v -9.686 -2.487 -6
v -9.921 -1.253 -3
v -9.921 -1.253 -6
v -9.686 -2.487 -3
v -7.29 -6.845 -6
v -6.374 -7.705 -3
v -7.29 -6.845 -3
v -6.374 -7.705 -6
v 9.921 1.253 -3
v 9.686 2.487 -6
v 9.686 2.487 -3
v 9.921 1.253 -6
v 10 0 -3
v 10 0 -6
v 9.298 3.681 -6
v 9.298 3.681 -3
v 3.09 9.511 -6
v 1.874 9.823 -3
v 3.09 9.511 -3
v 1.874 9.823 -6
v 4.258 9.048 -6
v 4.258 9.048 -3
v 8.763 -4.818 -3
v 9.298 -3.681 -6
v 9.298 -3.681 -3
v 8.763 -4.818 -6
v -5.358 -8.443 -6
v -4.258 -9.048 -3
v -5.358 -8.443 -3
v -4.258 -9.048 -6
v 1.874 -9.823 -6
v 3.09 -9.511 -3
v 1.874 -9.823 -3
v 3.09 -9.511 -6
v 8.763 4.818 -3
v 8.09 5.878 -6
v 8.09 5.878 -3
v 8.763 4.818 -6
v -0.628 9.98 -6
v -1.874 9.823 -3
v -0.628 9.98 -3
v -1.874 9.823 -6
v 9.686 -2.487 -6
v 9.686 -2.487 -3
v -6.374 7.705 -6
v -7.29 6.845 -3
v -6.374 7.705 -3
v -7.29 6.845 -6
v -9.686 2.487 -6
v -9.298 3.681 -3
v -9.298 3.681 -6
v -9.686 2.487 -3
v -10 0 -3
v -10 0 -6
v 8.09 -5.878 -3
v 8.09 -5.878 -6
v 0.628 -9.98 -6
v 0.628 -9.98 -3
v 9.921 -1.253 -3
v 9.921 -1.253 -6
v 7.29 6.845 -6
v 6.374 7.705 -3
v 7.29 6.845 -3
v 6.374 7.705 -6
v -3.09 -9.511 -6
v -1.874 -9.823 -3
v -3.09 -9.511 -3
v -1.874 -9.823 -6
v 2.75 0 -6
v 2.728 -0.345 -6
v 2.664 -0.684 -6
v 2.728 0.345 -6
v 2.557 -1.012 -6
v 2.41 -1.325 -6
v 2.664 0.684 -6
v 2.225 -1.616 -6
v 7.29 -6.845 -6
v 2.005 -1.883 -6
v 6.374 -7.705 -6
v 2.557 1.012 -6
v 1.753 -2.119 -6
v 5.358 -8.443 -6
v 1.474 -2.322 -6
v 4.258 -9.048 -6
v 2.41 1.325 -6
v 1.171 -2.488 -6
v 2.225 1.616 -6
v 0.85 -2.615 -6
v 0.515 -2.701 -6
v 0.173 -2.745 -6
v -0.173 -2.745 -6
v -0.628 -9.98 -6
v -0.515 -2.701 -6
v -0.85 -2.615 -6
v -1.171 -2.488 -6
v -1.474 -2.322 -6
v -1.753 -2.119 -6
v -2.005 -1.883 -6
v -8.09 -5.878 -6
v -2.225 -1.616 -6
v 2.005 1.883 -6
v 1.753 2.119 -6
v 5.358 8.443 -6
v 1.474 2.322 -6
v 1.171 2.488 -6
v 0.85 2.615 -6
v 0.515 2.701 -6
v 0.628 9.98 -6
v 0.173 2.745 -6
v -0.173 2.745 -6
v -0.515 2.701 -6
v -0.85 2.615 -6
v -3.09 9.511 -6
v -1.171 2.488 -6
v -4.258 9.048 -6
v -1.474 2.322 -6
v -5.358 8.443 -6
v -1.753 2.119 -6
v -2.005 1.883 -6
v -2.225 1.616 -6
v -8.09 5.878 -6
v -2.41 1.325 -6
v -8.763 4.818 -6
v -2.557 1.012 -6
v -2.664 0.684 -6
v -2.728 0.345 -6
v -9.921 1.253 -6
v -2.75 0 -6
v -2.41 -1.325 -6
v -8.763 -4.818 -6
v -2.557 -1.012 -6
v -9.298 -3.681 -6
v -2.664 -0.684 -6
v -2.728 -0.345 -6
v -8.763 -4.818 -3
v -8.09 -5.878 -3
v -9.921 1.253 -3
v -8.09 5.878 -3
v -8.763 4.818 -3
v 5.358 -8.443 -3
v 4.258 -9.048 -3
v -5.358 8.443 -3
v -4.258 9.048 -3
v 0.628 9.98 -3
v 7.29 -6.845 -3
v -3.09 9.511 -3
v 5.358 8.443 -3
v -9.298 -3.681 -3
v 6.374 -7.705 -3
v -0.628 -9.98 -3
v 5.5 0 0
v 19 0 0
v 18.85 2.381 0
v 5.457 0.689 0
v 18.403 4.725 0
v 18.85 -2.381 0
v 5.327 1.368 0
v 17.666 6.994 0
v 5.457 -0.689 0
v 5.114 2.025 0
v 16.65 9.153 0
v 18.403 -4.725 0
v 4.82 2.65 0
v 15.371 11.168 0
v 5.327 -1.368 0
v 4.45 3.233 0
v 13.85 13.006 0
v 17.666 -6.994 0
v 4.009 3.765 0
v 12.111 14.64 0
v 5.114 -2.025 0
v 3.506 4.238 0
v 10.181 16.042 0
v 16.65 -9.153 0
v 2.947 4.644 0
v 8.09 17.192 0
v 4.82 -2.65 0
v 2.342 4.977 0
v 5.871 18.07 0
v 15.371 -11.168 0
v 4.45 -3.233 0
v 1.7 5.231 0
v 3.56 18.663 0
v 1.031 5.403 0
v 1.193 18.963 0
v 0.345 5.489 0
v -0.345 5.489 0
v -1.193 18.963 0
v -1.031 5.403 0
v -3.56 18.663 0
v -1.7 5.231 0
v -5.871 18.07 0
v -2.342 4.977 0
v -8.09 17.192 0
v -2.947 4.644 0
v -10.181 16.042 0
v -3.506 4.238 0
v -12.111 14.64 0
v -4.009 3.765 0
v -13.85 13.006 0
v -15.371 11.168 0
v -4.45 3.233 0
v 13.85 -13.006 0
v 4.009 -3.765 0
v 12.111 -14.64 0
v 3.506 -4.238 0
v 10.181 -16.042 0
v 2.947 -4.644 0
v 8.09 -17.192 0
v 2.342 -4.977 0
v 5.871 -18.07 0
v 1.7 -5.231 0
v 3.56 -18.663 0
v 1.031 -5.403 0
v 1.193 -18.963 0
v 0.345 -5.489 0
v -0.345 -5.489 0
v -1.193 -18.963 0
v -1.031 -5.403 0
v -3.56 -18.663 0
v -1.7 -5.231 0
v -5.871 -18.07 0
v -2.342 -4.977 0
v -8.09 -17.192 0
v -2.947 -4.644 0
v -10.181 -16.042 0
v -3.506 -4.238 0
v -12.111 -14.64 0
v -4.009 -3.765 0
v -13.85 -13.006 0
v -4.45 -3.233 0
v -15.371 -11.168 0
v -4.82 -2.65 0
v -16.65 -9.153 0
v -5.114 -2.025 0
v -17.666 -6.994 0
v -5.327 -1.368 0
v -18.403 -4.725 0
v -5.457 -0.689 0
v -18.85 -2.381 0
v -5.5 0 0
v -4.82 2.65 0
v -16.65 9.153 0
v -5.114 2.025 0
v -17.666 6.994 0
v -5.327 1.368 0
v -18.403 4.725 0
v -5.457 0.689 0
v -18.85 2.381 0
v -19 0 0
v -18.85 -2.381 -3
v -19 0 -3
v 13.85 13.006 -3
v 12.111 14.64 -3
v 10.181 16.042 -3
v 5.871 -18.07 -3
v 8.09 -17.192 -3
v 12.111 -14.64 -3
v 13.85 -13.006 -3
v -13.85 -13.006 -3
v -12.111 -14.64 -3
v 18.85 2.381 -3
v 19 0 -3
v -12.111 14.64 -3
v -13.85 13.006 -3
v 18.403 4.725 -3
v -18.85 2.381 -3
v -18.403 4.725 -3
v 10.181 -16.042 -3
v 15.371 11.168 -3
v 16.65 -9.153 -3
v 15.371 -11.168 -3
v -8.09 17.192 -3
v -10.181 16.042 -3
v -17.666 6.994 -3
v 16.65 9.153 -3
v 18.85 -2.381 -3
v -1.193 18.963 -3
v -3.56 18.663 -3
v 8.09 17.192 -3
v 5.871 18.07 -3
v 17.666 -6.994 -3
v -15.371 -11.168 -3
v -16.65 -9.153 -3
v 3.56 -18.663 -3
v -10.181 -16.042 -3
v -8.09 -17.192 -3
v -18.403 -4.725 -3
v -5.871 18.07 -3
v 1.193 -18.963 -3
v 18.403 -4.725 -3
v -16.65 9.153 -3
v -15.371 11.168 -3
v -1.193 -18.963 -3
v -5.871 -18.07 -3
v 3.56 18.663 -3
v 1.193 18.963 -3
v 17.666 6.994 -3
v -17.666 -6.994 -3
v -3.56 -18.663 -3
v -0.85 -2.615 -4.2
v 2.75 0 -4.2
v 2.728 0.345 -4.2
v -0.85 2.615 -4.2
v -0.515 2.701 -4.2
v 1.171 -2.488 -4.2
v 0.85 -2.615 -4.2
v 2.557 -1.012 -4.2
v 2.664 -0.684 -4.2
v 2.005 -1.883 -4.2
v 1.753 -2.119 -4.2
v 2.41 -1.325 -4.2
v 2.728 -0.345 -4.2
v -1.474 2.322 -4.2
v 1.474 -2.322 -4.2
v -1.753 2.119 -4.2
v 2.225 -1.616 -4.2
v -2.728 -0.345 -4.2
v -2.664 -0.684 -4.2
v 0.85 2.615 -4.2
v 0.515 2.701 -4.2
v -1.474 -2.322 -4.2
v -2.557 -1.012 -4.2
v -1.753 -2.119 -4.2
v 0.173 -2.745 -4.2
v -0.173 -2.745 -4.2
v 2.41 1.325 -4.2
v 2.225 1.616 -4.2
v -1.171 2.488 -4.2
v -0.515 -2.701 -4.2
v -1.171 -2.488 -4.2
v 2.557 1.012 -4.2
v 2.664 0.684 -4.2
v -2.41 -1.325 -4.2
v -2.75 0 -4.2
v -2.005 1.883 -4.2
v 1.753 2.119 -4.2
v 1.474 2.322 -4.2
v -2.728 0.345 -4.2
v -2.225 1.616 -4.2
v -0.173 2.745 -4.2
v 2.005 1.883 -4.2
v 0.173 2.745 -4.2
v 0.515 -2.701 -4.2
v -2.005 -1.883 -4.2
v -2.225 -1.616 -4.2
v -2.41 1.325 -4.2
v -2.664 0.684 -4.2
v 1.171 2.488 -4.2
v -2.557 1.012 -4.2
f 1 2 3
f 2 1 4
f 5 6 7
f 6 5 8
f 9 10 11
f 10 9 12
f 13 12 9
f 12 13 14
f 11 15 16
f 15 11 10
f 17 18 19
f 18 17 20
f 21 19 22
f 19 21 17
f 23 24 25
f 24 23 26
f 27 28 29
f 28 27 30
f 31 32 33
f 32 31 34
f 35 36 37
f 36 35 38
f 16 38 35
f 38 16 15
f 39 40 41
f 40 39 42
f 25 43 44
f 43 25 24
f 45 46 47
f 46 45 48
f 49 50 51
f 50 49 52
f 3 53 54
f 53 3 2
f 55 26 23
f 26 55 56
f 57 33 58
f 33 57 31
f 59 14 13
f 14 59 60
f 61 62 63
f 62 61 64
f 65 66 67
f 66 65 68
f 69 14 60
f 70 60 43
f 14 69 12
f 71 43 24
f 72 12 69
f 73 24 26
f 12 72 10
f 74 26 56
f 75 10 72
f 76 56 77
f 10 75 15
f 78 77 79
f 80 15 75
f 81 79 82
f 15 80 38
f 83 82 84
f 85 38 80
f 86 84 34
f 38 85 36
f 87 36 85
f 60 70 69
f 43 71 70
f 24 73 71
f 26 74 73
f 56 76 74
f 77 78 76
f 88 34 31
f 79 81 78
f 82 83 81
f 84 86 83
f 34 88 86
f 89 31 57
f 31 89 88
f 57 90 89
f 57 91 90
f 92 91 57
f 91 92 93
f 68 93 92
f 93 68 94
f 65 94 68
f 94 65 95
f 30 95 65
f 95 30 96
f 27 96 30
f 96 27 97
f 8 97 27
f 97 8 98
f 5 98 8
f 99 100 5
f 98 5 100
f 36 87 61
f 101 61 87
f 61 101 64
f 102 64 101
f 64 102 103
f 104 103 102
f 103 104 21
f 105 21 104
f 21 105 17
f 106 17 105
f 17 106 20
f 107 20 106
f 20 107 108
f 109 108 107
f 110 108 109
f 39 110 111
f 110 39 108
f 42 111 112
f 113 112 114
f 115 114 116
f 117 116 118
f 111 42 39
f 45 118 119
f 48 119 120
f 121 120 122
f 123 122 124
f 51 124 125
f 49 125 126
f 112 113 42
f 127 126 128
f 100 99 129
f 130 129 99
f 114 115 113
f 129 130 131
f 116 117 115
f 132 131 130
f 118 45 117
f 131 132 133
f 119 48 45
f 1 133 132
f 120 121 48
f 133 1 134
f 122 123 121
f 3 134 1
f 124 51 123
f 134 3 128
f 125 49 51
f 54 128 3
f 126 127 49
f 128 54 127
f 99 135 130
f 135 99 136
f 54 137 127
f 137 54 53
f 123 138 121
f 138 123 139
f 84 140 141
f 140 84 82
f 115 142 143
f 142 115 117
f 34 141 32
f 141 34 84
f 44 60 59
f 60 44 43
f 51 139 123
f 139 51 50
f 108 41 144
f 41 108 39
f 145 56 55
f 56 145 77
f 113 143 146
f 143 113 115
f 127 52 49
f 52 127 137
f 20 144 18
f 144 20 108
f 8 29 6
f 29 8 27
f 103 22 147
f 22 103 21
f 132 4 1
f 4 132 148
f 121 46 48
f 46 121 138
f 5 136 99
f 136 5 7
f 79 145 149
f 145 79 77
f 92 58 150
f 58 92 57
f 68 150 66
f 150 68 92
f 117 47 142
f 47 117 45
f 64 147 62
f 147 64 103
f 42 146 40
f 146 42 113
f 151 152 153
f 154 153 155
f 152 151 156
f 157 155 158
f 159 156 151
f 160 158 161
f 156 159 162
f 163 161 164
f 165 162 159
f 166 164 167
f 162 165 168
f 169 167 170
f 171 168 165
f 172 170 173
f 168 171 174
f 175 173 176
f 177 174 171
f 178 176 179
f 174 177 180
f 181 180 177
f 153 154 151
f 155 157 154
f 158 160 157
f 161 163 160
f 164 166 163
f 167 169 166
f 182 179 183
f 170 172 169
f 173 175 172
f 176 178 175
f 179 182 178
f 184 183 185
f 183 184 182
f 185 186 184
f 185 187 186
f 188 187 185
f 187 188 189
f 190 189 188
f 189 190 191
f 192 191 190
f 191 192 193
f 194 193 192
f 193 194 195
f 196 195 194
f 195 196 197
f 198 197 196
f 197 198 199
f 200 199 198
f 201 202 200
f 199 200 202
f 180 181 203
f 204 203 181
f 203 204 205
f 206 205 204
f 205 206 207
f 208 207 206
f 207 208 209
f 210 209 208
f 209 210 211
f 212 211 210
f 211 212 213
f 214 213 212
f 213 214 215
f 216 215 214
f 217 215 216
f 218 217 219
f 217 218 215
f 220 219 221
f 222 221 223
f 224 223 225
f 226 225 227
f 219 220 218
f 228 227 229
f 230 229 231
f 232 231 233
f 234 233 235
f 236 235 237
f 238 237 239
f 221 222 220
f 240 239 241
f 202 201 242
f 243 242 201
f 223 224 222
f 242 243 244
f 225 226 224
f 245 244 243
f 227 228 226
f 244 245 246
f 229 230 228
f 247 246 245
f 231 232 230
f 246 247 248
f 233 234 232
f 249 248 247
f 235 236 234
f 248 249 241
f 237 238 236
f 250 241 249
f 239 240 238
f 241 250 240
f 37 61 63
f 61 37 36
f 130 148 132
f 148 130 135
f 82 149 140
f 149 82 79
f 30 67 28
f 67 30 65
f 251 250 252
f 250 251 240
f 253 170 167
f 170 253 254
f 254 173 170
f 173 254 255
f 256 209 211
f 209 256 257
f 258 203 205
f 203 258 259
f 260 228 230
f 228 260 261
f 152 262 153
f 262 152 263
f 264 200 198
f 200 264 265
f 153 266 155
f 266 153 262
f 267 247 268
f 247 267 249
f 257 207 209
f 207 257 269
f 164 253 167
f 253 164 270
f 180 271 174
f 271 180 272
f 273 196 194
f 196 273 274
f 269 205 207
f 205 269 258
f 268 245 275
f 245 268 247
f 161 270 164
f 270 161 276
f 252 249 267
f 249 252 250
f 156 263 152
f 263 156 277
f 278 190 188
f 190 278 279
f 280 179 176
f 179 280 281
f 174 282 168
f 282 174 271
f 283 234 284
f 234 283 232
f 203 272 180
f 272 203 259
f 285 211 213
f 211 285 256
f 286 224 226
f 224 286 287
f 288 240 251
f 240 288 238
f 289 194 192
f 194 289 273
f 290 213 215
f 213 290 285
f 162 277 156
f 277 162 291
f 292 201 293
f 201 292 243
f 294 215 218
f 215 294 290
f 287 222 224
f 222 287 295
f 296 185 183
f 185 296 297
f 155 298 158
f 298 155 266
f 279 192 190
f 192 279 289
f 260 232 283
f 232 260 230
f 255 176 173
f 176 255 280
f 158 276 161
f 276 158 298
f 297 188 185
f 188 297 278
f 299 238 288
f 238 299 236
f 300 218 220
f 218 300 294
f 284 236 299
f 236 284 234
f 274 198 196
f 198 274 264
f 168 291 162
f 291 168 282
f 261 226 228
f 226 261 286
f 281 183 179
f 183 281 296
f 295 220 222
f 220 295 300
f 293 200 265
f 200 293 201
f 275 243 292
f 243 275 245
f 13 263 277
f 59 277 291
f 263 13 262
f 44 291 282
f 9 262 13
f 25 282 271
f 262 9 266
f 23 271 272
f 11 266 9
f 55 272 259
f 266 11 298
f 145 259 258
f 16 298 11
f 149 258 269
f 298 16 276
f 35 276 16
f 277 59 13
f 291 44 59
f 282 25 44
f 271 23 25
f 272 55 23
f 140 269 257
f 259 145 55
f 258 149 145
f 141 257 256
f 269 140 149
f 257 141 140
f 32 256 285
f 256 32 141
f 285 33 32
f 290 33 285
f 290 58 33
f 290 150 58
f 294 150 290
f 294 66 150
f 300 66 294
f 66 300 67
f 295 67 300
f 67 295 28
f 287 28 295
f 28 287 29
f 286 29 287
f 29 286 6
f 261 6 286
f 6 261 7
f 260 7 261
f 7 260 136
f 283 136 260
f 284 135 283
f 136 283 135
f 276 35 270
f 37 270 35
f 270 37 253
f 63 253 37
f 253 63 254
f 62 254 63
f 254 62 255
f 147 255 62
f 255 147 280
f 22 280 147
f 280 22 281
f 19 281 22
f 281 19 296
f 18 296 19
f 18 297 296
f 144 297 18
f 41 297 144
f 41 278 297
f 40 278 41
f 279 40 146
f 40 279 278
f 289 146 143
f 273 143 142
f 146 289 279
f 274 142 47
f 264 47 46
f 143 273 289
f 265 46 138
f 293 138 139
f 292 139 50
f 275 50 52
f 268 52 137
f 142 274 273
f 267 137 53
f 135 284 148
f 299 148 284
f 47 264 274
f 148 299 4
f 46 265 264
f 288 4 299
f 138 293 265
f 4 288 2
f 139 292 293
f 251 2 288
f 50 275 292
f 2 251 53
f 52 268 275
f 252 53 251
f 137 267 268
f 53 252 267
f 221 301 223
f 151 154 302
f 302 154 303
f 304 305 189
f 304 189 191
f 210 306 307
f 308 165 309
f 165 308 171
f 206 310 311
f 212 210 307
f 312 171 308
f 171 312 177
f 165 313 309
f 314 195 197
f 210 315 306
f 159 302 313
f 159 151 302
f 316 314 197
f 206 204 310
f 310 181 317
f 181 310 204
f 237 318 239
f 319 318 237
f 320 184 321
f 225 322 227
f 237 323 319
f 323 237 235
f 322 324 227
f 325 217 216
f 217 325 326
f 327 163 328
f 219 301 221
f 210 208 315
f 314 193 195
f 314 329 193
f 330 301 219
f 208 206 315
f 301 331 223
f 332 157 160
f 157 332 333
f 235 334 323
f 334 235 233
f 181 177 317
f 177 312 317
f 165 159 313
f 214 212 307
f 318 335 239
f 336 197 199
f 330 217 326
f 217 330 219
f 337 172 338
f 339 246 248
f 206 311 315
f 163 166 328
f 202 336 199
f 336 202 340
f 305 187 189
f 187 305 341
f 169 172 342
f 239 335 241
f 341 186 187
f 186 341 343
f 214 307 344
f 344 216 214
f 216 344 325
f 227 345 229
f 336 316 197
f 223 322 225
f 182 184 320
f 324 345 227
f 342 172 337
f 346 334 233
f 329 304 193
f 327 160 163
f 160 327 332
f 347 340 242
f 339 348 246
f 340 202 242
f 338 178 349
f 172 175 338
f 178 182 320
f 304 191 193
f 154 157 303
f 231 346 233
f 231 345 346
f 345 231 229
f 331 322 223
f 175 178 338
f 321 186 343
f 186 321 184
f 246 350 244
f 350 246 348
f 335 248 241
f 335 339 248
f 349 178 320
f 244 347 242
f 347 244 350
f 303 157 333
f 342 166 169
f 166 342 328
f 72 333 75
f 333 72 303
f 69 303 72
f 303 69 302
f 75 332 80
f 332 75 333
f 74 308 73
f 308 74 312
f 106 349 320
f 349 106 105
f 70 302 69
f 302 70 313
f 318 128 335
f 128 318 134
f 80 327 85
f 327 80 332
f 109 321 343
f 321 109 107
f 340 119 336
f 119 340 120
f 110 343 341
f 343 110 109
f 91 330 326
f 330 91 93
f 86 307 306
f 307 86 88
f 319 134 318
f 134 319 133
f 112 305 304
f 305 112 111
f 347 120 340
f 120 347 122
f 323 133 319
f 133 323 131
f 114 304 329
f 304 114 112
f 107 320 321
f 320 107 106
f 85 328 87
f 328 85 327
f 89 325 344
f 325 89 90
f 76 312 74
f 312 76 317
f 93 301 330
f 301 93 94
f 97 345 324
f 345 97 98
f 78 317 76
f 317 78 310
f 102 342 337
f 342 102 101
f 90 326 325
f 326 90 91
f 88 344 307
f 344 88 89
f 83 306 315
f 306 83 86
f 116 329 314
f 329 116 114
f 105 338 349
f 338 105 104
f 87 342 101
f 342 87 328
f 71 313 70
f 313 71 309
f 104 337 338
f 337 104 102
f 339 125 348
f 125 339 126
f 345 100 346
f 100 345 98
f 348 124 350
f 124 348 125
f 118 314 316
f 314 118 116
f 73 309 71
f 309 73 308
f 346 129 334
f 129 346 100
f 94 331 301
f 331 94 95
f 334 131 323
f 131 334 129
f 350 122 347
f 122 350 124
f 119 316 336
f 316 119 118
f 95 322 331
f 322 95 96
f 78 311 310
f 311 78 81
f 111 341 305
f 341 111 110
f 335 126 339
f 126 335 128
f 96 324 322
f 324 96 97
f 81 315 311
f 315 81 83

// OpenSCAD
$fn = 50;


difference() {
	union() {
		translate(v = [0, 0, -6.0000000000]) {
			cylinder(h = 6, r = 10.0000000000);
		}
		translate(v = [0, 0, -3.0000000000]) {
			cylinder(h = 3, r = 19.0000000000);
		}
	}
	union() {
		translate(v = [0, 0, 0]) {
			rotate(a = [0, 0, 0]) {
				difference() {
					union() {
						#translate(v = [0, 0, -6.0000000000]) {
							cylinder(h = 6, r = 2.2500000000);
						}
						#translate(v = [0, 0, -4.2000000000]) {
							cylinder(h = 4.2000000000, r = 10.0000000000, r1 = 2.7500000000, r2 = 5.5000000000);
						}
						#translate(v = [0, 0, -6.0000000000]) {
							cylinder(h = 6, r = 2.7500000000);
						}
						#translate(v = [0, 0, -6.0000000000]) {
							cylinder(h = 6, r = 2.2500000000);
						}
					}
					union();
				}
			}
		}
	}
}
